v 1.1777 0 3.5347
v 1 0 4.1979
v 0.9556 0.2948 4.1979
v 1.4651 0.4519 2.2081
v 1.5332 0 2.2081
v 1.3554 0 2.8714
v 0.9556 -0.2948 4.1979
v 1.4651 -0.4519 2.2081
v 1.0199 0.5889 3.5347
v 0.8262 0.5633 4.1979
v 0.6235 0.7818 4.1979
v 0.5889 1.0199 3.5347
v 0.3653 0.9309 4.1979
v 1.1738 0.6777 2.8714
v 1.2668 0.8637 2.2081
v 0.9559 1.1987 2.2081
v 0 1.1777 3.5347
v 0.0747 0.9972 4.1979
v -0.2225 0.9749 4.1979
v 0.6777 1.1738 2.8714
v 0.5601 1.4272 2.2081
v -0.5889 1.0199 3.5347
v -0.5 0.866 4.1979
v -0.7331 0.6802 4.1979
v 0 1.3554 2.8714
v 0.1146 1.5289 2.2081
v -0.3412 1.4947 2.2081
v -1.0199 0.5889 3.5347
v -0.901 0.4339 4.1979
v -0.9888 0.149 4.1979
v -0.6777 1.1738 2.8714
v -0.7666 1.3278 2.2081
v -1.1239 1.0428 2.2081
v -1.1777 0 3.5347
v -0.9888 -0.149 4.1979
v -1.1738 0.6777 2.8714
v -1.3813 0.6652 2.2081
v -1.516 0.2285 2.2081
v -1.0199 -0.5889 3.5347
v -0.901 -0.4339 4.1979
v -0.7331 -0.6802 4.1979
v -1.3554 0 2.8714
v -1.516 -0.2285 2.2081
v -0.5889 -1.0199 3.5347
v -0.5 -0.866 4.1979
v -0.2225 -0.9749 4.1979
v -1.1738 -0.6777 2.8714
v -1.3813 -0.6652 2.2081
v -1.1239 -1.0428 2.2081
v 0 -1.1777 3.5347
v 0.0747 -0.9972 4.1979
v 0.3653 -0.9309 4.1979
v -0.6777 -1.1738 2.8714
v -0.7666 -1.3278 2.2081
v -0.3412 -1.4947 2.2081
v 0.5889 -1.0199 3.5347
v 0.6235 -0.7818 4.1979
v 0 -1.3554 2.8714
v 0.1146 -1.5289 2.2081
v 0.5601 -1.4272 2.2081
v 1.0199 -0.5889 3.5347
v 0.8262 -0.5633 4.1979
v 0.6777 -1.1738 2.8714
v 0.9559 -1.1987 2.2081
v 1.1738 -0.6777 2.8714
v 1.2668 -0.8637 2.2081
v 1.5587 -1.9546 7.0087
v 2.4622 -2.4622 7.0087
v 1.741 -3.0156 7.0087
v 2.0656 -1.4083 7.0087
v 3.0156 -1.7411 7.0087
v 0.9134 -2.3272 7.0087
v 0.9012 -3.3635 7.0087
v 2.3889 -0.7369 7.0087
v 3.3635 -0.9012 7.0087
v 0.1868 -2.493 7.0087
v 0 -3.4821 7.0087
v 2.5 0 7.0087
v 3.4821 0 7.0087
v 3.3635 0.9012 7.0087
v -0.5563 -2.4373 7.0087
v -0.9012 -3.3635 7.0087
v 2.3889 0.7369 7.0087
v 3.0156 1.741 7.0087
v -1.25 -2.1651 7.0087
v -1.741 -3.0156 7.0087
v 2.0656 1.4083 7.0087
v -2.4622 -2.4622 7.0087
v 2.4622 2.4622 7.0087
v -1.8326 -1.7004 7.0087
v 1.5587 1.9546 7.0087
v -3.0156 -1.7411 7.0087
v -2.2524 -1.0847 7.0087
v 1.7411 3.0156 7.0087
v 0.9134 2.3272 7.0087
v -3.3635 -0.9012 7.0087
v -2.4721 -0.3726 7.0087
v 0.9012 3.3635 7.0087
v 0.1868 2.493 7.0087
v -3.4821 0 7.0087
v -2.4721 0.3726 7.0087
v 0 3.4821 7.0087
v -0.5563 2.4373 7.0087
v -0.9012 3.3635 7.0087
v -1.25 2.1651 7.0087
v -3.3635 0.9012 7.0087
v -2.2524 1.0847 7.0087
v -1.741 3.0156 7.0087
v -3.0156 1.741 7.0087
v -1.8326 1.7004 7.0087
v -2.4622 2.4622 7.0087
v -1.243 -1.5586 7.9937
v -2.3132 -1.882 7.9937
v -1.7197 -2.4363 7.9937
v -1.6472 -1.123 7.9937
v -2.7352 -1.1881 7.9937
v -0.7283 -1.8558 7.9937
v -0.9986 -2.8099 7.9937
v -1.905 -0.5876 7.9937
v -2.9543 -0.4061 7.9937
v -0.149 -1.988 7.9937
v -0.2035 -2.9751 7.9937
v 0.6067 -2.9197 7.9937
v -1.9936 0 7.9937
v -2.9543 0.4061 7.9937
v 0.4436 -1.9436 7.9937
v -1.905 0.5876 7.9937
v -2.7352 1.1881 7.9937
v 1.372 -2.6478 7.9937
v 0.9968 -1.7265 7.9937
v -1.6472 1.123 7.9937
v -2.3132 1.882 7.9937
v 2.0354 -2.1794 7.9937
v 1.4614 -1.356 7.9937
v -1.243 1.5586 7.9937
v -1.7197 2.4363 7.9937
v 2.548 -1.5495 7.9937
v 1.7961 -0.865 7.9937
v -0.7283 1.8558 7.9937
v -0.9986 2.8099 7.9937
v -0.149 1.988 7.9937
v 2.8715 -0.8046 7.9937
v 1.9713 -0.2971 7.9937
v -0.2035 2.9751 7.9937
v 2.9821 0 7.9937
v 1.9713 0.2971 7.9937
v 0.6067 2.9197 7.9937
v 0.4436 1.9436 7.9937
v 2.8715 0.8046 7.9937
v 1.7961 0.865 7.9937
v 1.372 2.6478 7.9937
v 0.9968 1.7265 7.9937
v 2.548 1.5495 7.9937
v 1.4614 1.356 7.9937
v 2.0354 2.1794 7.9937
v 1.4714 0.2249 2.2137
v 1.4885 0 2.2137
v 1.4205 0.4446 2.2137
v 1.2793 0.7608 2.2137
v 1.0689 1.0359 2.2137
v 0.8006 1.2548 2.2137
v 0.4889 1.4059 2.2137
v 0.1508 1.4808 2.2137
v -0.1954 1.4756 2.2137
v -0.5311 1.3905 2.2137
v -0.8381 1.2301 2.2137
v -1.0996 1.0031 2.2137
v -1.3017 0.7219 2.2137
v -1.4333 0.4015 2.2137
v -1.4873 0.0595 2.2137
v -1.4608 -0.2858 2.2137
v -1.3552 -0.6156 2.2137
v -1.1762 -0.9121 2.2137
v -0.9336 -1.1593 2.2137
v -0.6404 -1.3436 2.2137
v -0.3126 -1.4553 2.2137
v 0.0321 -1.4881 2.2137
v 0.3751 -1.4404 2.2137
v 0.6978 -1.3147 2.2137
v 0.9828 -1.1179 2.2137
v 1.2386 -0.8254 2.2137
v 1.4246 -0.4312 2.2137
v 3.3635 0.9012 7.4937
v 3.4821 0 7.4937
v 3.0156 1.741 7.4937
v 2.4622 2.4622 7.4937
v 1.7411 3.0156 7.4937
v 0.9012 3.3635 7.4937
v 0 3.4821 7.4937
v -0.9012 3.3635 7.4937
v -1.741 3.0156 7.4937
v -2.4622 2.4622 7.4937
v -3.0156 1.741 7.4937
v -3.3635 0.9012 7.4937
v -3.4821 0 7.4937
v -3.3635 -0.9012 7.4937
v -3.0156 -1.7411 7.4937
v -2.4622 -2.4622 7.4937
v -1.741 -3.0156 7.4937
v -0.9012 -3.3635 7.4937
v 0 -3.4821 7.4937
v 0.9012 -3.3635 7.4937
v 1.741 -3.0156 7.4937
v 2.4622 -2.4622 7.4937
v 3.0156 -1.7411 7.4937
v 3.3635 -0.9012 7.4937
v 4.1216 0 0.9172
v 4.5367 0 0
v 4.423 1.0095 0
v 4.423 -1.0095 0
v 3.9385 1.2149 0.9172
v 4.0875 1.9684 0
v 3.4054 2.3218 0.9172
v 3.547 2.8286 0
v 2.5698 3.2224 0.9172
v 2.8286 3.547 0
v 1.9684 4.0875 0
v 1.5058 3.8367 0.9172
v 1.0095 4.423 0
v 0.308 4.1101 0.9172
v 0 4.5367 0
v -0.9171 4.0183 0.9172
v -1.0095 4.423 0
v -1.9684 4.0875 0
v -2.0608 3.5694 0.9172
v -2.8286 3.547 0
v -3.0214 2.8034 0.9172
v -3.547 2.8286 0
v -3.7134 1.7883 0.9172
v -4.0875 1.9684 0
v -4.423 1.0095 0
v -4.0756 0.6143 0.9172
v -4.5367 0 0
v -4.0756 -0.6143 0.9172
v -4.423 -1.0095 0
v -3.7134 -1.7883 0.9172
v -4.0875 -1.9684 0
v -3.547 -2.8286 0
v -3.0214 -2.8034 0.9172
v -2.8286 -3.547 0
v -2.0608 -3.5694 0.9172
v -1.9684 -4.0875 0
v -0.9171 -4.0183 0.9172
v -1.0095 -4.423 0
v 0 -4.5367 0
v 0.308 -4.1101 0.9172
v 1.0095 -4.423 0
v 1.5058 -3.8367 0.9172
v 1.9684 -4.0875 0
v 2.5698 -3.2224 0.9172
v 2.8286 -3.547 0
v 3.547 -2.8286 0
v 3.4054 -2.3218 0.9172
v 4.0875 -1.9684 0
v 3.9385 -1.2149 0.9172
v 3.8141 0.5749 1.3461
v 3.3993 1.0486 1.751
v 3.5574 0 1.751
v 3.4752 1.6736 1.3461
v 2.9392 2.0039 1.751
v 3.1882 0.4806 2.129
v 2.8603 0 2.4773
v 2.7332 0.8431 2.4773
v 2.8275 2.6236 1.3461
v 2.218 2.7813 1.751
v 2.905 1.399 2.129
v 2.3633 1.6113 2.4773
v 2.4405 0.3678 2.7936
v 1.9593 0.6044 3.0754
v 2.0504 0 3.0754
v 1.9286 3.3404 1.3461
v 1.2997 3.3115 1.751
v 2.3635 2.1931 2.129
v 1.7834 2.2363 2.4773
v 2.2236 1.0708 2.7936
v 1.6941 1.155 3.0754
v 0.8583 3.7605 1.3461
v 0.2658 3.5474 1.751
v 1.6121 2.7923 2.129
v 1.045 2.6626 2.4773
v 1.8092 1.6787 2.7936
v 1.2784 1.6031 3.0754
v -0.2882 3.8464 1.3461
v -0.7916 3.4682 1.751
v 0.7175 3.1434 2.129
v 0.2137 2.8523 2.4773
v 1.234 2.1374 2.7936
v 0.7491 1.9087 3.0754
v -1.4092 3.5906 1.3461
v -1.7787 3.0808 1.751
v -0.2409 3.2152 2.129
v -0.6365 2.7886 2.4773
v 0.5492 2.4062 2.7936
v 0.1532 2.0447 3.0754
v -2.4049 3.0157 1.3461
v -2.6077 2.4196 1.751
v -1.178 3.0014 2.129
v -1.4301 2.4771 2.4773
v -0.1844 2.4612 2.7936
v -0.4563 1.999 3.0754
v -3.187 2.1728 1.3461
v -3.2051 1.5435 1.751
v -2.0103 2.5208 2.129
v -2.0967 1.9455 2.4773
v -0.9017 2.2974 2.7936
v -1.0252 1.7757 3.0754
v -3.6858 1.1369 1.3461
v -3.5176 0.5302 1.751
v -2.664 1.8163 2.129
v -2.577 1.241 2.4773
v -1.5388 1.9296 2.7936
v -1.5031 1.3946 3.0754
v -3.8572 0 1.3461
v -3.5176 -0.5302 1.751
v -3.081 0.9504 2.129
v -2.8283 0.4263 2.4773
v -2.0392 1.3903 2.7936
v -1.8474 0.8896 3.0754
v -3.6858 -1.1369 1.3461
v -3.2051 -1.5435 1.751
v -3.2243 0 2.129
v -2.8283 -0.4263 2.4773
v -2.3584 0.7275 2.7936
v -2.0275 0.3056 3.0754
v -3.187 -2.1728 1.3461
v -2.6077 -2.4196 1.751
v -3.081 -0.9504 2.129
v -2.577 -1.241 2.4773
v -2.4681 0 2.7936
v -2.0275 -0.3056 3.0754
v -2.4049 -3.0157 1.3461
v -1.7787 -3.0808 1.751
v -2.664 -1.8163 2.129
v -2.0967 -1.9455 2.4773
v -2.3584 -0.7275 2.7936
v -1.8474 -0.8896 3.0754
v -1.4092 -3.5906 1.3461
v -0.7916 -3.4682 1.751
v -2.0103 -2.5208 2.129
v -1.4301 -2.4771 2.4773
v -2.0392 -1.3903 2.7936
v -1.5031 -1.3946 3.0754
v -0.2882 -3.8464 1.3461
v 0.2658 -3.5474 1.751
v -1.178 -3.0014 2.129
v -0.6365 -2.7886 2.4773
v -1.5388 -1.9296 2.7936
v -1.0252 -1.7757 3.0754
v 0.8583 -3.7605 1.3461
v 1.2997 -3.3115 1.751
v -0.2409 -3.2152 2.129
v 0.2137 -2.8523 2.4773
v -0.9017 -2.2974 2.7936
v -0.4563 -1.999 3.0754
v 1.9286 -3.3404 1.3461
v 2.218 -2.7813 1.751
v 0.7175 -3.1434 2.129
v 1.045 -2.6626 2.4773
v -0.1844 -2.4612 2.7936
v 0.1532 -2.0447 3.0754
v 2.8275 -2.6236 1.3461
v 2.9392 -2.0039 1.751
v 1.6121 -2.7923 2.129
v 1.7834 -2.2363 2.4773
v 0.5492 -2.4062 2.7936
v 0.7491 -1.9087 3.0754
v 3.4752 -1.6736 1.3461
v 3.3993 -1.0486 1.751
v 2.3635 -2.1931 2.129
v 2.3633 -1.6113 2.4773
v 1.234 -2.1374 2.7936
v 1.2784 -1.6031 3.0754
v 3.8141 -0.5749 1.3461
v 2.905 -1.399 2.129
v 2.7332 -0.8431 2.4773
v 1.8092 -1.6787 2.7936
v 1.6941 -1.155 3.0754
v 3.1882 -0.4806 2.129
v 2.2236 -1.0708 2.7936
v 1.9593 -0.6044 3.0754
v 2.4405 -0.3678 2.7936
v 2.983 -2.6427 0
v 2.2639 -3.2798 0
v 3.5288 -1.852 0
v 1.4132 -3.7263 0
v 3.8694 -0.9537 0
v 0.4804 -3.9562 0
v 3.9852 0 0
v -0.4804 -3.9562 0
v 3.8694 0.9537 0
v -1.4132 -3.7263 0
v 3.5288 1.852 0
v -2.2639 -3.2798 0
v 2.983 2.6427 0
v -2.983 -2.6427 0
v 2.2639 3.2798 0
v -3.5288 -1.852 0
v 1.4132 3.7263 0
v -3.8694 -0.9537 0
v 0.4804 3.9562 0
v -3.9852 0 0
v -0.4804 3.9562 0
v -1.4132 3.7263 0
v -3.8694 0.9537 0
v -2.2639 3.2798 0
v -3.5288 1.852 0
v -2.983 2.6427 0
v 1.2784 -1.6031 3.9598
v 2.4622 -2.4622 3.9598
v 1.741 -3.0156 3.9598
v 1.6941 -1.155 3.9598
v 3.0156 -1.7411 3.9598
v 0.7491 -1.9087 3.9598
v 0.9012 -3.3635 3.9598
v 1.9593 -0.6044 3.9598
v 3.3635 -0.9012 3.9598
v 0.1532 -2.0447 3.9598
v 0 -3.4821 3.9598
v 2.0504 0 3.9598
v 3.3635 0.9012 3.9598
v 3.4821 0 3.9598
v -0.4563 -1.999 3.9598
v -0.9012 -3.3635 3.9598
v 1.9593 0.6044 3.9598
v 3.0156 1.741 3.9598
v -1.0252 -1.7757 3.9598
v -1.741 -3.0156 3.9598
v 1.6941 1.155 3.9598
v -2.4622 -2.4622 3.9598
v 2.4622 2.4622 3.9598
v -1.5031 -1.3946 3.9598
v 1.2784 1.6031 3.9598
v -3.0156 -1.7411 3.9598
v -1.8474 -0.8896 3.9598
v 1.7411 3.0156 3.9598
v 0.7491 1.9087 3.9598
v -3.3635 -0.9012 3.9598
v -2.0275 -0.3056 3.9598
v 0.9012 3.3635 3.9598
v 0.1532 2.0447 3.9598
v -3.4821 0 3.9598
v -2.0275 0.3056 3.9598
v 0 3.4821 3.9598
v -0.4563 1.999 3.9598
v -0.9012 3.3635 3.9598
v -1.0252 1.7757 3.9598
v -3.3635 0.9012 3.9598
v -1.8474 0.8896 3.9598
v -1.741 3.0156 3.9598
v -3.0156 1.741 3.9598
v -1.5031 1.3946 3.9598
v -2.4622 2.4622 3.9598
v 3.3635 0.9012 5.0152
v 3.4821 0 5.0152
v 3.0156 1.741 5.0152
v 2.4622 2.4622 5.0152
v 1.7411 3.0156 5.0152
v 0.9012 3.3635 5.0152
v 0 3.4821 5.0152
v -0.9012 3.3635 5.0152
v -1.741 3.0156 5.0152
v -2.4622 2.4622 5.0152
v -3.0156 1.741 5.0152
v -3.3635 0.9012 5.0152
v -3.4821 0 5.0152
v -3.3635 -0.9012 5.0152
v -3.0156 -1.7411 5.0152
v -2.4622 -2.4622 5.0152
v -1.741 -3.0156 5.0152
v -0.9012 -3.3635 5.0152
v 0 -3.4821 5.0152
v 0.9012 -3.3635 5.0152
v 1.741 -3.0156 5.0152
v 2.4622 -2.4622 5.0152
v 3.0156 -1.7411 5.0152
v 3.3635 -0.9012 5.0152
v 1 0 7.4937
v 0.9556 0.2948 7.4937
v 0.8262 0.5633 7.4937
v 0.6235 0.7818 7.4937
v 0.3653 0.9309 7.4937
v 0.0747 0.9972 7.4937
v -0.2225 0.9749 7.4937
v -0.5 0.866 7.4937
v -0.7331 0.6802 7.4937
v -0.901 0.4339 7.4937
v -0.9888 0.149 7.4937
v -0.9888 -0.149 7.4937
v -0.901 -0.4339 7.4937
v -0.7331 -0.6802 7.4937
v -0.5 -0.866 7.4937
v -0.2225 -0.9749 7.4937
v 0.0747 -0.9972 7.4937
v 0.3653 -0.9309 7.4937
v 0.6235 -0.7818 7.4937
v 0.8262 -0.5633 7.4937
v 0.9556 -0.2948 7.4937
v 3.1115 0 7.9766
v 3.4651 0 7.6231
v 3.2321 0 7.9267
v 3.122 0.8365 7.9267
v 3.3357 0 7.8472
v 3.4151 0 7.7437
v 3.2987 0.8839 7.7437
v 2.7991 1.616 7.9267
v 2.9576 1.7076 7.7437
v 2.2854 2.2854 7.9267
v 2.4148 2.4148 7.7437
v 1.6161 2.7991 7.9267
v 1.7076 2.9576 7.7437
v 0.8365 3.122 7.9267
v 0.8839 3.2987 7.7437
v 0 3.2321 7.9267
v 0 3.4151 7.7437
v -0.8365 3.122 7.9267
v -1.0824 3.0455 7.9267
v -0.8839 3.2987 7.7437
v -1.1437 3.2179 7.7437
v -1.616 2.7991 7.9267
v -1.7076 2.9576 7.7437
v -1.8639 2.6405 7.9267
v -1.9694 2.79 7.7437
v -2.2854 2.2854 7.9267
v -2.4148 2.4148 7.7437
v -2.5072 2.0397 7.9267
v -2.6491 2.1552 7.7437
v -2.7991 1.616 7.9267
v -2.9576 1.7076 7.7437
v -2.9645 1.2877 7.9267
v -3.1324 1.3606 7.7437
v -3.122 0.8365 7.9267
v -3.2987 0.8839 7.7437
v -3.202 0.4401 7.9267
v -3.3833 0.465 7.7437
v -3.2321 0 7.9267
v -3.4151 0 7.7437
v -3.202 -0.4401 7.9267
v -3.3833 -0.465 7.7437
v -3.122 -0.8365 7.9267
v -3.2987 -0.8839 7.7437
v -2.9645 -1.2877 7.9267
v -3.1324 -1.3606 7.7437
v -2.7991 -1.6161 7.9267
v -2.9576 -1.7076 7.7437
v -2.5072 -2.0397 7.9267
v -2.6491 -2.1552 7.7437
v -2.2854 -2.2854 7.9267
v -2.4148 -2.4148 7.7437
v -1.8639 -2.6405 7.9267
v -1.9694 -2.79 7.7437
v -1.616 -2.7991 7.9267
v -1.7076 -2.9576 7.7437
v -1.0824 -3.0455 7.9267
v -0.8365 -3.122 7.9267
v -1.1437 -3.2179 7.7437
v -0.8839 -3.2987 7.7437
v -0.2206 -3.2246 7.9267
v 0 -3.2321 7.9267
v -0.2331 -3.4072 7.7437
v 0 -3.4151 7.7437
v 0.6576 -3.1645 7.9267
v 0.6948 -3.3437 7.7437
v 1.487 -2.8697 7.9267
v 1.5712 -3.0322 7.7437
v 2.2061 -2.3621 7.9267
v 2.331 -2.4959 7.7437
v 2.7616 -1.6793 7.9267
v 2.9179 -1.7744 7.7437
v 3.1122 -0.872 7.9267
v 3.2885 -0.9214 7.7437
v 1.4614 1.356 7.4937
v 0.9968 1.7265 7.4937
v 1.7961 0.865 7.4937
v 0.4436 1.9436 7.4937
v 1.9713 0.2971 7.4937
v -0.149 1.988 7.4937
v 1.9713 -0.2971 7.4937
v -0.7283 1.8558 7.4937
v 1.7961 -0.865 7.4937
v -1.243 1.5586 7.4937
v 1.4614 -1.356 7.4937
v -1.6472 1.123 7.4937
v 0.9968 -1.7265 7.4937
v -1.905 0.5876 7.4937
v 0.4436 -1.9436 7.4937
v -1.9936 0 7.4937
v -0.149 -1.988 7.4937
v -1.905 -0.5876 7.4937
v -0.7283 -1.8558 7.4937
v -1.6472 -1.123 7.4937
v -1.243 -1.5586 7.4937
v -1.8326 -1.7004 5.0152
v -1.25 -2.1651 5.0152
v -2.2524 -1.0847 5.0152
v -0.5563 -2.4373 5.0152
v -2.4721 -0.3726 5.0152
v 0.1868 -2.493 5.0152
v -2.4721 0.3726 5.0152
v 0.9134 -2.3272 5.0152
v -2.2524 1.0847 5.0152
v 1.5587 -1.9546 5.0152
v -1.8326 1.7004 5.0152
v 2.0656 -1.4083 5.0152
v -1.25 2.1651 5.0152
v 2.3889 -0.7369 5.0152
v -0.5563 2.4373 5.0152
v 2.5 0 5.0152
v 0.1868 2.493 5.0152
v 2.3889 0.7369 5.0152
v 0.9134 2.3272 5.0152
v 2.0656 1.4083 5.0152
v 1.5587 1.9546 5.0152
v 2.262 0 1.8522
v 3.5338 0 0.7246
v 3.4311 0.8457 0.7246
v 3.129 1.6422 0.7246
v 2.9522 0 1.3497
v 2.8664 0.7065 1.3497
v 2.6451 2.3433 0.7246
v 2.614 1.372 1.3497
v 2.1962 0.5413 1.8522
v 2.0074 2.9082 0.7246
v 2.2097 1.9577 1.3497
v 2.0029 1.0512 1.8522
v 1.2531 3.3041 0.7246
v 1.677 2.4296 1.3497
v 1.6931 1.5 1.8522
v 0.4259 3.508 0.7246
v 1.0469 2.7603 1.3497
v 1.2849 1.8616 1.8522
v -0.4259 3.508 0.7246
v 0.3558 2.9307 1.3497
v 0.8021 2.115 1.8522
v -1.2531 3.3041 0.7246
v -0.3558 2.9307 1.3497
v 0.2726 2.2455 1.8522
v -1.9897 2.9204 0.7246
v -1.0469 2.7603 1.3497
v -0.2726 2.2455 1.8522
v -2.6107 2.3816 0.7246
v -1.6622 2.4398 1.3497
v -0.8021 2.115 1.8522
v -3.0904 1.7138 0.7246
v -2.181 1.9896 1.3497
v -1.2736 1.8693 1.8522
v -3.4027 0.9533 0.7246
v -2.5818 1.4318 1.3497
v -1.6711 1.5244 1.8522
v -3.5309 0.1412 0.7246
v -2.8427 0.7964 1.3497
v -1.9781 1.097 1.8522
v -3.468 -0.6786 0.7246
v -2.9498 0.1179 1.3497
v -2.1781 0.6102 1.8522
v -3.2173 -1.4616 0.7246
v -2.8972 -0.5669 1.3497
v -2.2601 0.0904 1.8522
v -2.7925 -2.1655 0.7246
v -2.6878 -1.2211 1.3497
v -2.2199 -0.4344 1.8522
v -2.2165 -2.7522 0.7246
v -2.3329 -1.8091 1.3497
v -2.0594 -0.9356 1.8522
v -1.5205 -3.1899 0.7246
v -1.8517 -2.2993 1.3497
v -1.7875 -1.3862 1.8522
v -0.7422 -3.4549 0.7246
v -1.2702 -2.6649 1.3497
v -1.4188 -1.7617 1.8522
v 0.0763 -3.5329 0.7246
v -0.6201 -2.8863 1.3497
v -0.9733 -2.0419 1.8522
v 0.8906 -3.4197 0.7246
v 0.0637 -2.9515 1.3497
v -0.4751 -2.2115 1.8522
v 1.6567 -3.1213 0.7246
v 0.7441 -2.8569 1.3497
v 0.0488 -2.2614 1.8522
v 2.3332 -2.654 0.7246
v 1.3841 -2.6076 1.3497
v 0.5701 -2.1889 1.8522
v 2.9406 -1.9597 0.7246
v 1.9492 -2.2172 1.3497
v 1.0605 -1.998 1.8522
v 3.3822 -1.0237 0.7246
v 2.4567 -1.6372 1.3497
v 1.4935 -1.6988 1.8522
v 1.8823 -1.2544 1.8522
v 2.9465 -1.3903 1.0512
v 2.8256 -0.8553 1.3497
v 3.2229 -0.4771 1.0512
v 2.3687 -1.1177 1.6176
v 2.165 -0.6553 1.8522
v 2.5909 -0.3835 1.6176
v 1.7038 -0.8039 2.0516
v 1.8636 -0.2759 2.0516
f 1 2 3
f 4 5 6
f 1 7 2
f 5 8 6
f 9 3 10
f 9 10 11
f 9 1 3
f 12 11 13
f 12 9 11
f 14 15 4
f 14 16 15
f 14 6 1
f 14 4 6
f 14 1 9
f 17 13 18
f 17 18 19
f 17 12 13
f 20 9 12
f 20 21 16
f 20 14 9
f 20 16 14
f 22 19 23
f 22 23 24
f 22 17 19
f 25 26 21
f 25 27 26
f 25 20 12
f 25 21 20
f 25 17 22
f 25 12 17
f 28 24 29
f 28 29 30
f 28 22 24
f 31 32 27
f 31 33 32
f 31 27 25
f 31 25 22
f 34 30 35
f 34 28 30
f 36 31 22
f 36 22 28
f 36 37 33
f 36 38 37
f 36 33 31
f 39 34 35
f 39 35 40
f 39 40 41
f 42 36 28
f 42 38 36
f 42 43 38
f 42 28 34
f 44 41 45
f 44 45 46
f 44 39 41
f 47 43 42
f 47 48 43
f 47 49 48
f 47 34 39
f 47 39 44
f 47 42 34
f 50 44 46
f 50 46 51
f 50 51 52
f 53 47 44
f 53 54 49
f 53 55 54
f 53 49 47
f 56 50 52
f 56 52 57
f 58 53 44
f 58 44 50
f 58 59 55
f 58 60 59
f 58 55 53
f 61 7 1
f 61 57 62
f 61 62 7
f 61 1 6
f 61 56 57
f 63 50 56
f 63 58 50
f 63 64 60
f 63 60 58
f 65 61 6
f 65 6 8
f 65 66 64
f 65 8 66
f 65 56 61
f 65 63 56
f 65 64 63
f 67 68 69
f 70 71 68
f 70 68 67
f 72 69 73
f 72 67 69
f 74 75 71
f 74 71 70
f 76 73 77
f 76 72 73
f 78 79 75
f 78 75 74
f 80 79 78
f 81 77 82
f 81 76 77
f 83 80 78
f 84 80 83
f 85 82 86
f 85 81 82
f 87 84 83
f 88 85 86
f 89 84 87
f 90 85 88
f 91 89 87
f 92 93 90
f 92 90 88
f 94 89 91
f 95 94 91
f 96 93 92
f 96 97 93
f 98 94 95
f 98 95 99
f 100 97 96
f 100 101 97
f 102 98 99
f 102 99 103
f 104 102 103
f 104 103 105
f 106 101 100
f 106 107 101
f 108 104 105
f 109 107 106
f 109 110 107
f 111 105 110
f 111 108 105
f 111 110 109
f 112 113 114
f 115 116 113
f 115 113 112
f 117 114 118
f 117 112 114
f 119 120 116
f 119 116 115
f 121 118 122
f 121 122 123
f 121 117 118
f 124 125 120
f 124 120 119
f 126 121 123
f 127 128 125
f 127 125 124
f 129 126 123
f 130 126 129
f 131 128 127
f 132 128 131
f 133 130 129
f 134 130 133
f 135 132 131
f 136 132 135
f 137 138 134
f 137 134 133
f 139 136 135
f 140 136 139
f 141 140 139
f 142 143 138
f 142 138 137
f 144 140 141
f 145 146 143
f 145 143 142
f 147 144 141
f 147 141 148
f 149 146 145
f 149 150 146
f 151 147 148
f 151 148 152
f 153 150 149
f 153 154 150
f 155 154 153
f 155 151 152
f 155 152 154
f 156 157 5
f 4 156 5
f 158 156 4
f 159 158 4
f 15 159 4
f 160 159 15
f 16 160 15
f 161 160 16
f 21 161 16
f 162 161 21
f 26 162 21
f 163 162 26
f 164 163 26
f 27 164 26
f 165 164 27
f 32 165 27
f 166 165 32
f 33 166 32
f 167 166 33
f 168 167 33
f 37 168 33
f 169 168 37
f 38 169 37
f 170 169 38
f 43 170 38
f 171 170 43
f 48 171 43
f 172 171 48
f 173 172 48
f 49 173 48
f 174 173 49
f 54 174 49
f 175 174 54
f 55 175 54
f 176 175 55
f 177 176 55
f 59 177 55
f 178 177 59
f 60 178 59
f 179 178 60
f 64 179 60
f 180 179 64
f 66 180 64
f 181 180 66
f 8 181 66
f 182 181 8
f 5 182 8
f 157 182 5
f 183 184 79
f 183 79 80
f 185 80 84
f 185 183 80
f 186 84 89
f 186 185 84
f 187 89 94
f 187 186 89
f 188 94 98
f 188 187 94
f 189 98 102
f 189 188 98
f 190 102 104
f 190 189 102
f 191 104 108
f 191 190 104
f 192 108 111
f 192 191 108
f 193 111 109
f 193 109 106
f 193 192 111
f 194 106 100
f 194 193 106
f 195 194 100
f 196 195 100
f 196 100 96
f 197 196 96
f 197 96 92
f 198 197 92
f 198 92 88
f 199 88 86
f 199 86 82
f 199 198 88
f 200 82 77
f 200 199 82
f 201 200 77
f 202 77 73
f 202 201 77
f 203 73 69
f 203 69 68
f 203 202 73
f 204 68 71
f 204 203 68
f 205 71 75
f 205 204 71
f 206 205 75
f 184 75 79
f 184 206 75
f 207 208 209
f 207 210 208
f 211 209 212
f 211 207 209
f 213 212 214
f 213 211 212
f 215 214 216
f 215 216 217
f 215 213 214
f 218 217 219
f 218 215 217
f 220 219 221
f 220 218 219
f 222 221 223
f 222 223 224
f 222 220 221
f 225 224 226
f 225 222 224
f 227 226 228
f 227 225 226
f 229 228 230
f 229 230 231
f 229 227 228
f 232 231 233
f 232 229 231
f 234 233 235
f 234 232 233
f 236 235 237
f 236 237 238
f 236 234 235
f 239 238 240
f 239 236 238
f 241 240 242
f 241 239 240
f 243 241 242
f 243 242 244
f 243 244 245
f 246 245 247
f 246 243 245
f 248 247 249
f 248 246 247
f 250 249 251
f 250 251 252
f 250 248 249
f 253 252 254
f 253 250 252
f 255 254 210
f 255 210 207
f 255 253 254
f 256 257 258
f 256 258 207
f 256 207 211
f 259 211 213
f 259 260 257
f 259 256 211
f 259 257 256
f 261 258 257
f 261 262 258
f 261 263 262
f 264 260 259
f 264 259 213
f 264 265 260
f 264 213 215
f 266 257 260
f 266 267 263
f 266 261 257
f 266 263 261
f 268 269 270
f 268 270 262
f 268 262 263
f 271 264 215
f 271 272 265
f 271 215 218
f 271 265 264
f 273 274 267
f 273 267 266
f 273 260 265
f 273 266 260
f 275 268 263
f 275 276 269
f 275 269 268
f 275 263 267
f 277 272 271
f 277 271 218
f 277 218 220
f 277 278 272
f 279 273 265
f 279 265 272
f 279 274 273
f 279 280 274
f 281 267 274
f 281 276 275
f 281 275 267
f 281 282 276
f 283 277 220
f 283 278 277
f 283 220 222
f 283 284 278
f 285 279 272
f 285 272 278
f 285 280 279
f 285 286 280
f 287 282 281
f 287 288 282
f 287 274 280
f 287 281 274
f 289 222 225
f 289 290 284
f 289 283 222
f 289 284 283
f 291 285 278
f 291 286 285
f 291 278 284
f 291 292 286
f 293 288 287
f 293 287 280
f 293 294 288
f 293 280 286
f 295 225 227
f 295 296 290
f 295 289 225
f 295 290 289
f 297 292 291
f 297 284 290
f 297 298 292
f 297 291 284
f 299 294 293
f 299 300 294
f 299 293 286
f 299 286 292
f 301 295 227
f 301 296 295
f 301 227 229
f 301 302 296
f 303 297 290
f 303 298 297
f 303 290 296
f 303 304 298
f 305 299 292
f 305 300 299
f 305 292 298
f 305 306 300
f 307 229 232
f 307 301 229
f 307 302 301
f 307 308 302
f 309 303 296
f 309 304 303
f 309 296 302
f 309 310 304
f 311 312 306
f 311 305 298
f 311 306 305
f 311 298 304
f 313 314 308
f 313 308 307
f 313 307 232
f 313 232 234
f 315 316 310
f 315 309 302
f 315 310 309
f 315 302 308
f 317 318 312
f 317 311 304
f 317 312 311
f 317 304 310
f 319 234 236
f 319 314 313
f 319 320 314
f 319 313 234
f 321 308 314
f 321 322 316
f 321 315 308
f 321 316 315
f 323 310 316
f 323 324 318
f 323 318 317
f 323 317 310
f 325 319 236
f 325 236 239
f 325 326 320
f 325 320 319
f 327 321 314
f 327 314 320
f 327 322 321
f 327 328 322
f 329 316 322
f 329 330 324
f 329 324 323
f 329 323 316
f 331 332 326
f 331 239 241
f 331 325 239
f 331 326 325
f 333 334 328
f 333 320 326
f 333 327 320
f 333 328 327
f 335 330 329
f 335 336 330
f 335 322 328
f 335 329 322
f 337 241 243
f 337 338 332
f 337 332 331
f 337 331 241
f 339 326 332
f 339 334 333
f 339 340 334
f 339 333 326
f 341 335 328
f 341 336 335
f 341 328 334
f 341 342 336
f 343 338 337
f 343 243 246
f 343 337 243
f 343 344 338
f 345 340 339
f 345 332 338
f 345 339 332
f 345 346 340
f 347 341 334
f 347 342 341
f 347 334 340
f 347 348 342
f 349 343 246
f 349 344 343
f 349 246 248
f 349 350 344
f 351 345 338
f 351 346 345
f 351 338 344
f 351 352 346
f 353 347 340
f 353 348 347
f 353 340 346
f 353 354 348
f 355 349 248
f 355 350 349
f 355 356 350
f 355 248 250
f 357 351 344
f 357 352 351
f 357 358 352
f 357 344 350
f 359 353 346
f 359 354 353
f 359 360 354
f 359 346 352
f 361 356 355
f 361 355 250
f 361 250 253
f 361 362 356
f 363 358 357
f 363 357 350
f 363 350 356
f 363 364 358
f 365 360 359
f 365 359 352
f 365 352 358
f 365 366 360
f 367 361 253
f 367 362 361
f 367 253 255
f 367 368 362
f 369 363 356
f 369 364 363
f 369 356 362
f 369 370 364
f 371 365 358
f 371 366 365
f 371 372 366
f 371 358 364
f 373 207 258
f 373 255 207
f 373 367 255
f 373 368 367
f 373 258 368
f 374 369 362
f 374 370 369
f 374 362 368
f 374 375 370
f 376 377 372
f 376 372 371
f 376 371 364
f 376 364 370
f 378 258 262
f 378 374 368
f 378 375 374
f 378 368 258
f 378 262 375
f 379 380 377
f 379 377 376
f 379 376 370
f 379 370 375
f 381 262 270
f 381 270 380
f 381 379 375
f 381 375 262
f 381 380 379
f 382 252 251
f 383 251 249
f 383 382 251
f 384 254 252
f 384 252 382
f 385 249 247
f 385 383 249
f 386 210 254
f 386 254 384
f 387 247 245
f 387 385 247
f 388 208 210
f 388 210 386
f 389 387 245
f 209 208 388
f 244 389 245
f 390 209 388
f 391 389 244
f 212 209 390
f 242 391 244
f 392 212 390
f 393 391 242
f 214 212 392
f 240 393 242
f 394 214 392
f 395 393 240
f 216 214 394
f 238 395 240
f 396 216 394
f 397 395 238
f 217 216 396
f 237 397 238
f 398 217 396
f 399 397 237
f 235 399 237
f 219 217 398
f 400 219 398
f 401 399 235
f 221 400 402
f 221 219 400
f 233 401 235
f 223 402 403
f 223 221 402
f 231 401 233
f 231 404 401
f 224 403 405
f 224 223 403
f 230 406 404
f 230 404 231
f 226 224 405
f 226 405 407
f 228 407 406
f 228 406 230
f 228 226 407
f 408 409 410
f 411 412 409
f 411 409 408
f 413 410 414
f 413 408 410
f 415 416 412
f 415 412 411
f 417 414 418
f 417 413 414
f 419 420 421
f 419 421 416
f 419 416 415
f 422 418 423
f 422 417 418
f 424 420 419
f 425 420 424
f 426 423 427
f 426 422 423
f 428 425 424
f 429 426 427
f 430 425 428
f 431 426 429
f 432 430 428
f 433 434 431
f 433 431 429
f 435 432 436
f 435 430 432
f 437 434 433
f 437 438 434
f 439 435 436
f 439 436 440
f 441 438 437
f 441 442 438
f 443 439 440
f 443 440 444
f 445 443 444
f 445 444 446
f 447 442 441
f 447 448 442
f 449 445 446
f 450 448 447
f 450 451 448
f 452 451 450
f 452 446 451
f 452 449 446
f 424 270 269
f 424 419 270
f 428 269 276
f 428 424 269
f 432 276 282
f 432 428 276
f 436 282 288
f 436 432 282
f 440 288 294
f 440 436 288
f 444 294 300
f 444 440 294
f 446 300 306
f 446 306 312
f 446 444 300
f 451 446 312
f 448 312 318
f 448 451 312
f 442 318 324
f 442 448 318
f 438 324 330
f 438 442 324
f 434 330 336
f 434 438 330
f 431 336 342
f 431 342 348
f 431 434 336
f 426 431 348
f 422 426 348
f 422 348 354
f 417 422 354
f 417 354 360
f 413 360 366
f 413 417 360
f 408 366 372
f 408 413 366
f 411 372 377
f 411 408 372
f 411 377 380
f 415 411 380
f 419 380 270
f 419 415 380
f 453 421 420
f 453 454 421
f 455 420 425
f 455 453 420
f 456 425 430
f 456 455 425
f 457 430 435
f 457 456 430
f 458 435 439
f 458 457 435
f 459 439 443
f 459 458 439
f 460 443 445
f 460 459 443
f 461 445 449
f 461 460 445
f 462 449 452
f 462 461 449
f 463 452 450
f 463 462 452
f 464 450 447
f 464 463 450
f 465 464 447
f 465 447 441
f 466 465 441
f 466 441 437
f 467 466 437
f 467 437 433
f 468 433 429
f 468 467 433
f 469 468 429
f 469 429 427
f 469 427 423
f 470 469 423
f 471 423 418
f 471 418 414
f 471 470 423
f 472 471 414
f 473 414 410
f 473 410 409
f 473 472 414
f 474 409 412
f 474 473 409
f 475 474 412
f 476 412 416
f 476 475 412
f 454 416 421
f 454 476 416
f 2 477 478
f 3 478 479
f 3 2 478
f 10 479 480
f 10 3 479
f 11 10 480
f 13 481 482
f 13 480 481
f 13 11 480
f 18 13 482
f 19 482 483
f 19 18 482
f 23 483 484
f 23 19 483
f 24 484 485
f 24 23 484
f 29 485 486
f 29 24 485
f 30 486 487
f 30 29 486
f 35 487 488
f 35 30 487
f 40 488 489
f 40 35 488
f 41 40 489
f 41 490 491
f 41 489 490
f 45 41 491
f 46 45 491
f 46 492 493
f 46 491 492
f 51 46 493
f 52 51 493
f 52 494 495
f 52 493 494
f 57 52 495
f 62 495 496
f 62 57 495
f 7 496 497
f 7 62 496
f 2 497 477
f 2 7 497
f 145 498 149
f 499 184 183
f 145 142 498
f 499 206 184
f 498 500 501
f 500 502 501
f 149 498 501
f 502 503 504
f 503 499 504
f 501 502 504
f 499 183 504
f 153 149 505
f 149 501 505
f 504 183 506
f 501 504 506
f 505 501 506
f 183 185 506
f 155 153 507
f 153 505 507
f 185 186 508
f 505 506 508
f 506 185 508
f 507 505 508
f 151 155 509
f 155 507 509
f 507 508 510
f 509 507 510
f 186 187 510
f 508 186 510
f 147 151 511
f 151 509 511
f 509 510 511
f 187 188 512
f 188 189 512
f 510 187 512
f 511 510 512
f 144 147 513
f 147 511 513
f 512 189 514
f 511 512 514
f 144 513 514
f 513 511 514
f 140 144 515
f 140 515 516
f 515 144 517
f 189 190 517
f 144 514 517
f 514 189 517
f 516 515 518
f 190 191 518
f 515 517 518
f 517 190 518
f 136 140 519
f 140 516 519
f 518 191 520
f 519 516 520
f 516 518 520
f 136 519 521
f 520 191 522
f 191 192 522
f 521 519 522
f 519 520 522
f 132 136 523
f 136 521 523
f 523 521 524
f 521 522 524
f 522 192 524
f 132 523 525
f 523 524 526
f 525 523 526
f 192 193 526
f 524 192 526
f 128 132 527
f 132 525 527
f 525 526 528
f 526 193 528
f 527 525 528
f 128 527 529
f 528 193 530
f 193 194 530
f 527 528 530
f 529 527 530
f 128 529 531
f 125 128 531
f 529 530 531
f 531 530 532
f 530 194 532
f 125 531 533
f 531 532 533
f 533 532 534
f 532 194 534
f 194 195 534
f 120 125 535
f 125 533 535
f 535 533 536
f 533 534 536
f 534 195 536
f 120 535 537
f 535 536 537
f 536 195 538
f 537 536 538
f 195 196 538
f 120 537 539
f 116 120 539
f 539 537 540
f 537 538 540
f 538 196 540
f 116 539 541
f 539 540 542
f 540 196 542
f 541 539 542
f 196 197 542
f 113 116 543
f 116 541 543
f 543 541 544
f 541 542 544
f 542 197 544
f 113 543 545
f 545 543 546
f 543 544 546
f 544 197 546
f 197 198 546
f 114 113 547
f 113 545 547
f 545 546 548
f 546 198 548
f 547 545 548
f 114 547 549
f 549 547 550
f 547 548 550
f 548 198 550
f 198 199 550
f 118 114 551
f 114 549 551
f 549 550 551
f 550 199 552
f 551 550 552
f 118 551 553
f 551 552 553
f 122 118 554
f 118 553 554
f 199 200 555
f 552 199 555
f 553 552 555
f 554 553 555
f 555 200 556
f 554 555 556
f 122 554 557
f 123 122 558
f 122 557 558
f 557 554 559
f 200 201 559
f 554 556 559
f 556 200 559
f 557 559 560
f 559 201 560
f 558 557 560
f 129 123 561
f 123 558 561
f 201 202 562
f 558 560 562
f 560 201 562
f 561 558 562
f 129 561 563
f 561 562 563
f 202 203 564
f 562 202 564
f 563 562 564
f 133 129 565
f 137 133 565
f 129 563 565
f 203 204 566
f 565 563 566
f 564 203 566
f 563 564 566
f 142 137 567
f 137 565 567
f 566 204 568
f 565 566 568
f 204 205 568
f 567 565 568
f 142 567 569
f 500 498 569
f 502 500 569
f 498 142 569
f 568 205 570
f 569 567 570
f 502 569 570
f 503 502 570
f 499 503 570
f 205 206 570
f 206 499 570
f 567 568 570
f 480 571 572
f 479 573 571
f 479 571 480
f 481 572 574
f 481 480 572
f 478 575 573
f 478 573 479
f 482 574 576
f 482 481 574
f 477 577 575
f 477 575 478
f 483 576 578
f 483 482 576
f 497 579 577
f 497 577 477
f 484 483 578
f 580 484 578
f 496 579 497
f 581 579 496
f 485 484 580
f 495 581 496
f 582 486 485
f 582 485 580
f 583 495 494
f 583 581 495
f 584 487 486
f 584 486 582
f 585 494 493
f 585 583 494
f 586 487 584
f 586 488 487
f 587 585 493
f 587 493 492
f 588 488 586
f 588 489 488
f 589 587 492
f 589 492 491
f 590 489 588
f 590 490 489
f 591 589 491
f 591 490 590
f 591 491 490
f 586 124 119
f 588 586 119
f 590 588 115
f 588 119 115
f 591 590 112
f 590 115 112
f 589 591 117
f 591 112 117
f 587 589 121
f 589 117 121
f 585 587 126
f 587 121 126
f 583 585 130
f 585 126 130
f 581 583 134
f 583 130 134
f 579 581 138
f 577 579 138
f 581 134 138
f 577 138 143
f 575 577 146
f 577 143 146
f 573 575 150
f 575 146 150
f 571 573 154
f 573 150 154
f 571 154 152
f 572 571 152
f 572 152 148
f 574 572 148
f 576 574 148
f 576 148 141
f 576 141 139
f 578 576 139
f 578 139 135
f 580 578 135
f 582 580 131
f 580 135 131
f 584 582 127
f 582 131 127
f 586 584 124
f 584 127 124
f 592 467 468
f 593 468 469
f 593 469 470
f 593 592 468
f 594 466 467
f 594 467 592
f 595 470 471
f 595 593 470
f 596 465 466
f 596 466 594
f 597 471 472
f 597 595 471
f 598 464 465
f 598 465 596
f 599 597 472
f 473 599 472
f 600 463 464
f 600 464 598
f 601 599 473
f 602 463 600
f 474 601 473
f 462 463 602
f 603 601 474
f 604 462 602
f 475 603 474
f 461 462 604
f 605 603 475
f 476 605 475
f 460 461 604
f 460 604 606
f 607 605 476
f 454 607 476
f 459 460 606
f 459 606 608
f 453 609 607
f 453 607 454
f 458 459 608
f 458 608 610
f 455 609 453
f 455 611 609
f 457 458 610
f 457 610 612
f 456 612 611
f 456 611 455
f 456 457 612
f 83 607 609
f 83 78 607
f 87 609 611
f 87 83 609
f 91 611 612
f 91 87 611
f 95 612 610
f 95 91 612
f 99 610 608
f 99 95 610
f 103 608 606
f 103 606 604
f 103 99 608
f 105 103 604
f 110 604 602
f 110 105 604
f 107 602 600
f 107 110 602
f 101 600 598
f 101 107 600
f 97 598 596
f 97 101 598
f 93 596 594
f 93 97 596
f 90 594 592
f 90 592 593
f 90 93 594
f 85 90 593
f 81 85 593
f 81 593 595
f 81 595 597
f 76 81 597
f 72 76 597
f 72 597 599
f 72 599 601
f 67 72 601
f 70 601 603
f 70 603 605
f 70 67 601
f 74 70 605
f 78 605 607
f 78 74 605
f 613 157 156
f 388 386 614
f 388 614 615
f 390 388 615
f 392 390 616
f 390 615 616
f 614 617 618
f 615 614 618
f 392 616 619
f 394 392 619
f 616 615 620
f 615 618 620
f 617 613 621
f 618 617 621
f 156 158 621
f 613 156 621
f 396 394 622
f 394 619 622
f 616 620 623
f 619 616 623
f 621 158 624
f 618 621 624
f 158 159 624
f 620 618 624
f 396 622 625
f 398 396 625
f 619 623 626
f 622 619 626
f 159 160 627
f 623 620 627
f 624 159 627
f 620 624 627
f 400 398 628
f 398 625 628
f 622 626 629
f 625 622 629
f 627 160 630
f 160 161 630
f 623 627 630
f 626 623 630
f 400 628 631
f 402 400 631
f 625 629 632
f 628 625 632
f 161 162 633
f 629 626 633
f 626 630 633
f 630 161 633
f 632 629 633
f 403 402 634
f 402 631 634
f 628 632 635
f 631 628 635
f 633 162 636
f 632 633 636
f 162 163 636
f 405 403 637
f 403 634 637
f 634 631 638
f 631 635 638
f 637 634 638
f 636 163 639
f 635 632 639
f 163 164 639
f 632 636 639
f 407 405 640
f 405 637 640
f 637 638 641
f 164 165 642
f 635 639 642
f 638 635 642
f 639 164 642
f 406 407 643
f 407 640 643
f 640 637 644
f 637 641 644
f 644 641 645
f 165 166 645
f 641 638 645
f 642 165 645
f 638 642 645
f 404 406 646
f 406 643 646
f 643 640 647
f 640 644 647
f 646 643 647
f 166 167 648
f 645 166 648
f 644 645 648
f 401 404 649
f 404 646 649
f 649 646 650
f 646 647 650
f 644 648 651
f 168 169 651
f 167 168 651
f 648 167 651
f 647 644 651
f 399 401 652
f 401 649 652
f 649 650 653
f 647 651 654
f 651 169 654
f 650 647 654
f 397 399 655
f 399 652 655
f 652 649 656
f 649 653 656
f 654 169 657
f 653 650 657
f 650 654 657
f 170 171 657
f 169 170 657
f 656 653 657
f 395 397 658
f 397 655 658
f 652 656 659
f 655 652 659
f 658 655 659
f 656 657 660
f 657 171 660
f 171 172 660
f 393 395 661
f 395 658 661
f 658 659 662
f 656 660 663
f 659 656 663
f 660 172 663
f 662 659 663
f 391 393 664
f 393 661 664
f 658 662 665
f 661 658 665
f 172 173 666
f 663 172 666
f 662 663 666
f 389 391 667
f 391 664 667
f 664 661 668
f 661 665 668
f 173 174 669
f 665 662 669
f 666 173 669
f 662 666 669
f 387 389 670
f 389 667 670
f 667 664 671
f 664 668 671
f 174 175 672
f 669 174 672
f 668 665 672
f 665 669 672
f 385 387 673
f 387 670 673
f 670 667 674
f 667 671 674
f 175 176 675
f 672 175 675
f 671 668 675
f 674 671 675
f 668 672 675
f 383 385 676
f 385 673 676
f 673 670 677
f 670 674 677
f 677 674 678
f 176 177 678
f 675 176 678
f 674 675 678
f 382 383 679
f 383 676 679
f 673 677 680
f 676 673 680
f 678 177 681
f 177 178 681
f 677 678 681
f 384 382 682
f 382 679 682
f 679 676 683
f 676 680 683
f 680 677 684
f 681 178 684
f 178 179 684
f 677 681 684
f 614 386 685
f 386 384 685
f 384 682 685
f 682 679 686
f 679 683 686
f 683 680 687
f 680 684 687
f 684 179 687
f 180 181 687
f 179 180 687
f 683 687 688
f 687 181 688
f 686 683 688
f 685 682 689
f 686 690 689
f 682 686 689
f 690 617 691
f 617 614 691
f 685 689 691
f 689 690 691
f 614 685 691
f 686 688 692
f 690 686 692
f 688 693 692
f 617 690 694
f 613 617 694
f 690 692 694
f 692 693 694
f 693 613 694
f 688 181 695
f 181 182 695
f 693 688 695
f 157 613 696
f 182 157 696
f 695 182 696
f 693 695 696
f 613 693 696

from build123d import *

# Parameters (mm, degrees)
SKETCH002_R  = 1.993559
POCKET_DEPTH = 0.5
FILLET_R     = 0.5


with BuildPart() as part:
    # Sketch → Revolution (revolve)
    with BuildSketch(Plane.XZ):
        with BuildLine():
            ThreePointArc((3.985235, 0), (2.344302, 1.802426), (0, 2.47))
            Line((0, 7.993666), (0, 2.47))
            Line((3.4821, 7.993666), (0, 7.993666))
            Line((3.4821, 7.008655), (3.4821, 7.993666))
            Line((2.5, 7.008655), (3.4821, 7.008655))
            Line((2.5, 5.015182), (2.5, 7.008655))
            Line((3.4821, 5.015182), (2.5, 5.015182))
            Line((3.4821, 3.959811), (3.4821, 5.015182))
            Line((2.050408, 3.959811), (3.4821, 3.959811))
            Line((2.050408, 3.075381), (2.050408, 3.959811))
            ThreePointArc((4.536749, 0), (3.55737, 1.750957), (2.050408, 3.075381))
            Line((3.985235, 0), (4.536749, 0))
        make_face()
    revolve(axis=Axis((0, 0, 0), (0, 0, 1)))

    # Sketch001 → Groove (revolve, cut)
    with BuildSketch(Plane.XZ):
        Polygon((1, 8.108983), (1, 4.197927), (1.533167, 2.20812), (0, 2.398983), (0, 8.108983), align=None)
    revolve(axis=Axis((0, 0, 0), (0, 0, 1)), mode=Mode.SUBTRACT)

    # Sketch002 (on Face8 of Groove) → Pocket (cut)
    with BuildSketch(Plane(origin=(0, 0, 7.993666), x_dir=(-1, 0, 0), z_dir=(0, 0, 1))):
        Circle(SKETCH002_R)
    extrude(amount=-POCKET_DEPTH, mode=Mode.SUBTRACT)

    # Fillet
    fillet_edges = [part.edges().sort_by_distance(p)[0] for p in [
        (-3.4821, 0, 7.993666),
    ]]
    fillet(fillet_edges, radius=FILLET_R)


solid = part.part
